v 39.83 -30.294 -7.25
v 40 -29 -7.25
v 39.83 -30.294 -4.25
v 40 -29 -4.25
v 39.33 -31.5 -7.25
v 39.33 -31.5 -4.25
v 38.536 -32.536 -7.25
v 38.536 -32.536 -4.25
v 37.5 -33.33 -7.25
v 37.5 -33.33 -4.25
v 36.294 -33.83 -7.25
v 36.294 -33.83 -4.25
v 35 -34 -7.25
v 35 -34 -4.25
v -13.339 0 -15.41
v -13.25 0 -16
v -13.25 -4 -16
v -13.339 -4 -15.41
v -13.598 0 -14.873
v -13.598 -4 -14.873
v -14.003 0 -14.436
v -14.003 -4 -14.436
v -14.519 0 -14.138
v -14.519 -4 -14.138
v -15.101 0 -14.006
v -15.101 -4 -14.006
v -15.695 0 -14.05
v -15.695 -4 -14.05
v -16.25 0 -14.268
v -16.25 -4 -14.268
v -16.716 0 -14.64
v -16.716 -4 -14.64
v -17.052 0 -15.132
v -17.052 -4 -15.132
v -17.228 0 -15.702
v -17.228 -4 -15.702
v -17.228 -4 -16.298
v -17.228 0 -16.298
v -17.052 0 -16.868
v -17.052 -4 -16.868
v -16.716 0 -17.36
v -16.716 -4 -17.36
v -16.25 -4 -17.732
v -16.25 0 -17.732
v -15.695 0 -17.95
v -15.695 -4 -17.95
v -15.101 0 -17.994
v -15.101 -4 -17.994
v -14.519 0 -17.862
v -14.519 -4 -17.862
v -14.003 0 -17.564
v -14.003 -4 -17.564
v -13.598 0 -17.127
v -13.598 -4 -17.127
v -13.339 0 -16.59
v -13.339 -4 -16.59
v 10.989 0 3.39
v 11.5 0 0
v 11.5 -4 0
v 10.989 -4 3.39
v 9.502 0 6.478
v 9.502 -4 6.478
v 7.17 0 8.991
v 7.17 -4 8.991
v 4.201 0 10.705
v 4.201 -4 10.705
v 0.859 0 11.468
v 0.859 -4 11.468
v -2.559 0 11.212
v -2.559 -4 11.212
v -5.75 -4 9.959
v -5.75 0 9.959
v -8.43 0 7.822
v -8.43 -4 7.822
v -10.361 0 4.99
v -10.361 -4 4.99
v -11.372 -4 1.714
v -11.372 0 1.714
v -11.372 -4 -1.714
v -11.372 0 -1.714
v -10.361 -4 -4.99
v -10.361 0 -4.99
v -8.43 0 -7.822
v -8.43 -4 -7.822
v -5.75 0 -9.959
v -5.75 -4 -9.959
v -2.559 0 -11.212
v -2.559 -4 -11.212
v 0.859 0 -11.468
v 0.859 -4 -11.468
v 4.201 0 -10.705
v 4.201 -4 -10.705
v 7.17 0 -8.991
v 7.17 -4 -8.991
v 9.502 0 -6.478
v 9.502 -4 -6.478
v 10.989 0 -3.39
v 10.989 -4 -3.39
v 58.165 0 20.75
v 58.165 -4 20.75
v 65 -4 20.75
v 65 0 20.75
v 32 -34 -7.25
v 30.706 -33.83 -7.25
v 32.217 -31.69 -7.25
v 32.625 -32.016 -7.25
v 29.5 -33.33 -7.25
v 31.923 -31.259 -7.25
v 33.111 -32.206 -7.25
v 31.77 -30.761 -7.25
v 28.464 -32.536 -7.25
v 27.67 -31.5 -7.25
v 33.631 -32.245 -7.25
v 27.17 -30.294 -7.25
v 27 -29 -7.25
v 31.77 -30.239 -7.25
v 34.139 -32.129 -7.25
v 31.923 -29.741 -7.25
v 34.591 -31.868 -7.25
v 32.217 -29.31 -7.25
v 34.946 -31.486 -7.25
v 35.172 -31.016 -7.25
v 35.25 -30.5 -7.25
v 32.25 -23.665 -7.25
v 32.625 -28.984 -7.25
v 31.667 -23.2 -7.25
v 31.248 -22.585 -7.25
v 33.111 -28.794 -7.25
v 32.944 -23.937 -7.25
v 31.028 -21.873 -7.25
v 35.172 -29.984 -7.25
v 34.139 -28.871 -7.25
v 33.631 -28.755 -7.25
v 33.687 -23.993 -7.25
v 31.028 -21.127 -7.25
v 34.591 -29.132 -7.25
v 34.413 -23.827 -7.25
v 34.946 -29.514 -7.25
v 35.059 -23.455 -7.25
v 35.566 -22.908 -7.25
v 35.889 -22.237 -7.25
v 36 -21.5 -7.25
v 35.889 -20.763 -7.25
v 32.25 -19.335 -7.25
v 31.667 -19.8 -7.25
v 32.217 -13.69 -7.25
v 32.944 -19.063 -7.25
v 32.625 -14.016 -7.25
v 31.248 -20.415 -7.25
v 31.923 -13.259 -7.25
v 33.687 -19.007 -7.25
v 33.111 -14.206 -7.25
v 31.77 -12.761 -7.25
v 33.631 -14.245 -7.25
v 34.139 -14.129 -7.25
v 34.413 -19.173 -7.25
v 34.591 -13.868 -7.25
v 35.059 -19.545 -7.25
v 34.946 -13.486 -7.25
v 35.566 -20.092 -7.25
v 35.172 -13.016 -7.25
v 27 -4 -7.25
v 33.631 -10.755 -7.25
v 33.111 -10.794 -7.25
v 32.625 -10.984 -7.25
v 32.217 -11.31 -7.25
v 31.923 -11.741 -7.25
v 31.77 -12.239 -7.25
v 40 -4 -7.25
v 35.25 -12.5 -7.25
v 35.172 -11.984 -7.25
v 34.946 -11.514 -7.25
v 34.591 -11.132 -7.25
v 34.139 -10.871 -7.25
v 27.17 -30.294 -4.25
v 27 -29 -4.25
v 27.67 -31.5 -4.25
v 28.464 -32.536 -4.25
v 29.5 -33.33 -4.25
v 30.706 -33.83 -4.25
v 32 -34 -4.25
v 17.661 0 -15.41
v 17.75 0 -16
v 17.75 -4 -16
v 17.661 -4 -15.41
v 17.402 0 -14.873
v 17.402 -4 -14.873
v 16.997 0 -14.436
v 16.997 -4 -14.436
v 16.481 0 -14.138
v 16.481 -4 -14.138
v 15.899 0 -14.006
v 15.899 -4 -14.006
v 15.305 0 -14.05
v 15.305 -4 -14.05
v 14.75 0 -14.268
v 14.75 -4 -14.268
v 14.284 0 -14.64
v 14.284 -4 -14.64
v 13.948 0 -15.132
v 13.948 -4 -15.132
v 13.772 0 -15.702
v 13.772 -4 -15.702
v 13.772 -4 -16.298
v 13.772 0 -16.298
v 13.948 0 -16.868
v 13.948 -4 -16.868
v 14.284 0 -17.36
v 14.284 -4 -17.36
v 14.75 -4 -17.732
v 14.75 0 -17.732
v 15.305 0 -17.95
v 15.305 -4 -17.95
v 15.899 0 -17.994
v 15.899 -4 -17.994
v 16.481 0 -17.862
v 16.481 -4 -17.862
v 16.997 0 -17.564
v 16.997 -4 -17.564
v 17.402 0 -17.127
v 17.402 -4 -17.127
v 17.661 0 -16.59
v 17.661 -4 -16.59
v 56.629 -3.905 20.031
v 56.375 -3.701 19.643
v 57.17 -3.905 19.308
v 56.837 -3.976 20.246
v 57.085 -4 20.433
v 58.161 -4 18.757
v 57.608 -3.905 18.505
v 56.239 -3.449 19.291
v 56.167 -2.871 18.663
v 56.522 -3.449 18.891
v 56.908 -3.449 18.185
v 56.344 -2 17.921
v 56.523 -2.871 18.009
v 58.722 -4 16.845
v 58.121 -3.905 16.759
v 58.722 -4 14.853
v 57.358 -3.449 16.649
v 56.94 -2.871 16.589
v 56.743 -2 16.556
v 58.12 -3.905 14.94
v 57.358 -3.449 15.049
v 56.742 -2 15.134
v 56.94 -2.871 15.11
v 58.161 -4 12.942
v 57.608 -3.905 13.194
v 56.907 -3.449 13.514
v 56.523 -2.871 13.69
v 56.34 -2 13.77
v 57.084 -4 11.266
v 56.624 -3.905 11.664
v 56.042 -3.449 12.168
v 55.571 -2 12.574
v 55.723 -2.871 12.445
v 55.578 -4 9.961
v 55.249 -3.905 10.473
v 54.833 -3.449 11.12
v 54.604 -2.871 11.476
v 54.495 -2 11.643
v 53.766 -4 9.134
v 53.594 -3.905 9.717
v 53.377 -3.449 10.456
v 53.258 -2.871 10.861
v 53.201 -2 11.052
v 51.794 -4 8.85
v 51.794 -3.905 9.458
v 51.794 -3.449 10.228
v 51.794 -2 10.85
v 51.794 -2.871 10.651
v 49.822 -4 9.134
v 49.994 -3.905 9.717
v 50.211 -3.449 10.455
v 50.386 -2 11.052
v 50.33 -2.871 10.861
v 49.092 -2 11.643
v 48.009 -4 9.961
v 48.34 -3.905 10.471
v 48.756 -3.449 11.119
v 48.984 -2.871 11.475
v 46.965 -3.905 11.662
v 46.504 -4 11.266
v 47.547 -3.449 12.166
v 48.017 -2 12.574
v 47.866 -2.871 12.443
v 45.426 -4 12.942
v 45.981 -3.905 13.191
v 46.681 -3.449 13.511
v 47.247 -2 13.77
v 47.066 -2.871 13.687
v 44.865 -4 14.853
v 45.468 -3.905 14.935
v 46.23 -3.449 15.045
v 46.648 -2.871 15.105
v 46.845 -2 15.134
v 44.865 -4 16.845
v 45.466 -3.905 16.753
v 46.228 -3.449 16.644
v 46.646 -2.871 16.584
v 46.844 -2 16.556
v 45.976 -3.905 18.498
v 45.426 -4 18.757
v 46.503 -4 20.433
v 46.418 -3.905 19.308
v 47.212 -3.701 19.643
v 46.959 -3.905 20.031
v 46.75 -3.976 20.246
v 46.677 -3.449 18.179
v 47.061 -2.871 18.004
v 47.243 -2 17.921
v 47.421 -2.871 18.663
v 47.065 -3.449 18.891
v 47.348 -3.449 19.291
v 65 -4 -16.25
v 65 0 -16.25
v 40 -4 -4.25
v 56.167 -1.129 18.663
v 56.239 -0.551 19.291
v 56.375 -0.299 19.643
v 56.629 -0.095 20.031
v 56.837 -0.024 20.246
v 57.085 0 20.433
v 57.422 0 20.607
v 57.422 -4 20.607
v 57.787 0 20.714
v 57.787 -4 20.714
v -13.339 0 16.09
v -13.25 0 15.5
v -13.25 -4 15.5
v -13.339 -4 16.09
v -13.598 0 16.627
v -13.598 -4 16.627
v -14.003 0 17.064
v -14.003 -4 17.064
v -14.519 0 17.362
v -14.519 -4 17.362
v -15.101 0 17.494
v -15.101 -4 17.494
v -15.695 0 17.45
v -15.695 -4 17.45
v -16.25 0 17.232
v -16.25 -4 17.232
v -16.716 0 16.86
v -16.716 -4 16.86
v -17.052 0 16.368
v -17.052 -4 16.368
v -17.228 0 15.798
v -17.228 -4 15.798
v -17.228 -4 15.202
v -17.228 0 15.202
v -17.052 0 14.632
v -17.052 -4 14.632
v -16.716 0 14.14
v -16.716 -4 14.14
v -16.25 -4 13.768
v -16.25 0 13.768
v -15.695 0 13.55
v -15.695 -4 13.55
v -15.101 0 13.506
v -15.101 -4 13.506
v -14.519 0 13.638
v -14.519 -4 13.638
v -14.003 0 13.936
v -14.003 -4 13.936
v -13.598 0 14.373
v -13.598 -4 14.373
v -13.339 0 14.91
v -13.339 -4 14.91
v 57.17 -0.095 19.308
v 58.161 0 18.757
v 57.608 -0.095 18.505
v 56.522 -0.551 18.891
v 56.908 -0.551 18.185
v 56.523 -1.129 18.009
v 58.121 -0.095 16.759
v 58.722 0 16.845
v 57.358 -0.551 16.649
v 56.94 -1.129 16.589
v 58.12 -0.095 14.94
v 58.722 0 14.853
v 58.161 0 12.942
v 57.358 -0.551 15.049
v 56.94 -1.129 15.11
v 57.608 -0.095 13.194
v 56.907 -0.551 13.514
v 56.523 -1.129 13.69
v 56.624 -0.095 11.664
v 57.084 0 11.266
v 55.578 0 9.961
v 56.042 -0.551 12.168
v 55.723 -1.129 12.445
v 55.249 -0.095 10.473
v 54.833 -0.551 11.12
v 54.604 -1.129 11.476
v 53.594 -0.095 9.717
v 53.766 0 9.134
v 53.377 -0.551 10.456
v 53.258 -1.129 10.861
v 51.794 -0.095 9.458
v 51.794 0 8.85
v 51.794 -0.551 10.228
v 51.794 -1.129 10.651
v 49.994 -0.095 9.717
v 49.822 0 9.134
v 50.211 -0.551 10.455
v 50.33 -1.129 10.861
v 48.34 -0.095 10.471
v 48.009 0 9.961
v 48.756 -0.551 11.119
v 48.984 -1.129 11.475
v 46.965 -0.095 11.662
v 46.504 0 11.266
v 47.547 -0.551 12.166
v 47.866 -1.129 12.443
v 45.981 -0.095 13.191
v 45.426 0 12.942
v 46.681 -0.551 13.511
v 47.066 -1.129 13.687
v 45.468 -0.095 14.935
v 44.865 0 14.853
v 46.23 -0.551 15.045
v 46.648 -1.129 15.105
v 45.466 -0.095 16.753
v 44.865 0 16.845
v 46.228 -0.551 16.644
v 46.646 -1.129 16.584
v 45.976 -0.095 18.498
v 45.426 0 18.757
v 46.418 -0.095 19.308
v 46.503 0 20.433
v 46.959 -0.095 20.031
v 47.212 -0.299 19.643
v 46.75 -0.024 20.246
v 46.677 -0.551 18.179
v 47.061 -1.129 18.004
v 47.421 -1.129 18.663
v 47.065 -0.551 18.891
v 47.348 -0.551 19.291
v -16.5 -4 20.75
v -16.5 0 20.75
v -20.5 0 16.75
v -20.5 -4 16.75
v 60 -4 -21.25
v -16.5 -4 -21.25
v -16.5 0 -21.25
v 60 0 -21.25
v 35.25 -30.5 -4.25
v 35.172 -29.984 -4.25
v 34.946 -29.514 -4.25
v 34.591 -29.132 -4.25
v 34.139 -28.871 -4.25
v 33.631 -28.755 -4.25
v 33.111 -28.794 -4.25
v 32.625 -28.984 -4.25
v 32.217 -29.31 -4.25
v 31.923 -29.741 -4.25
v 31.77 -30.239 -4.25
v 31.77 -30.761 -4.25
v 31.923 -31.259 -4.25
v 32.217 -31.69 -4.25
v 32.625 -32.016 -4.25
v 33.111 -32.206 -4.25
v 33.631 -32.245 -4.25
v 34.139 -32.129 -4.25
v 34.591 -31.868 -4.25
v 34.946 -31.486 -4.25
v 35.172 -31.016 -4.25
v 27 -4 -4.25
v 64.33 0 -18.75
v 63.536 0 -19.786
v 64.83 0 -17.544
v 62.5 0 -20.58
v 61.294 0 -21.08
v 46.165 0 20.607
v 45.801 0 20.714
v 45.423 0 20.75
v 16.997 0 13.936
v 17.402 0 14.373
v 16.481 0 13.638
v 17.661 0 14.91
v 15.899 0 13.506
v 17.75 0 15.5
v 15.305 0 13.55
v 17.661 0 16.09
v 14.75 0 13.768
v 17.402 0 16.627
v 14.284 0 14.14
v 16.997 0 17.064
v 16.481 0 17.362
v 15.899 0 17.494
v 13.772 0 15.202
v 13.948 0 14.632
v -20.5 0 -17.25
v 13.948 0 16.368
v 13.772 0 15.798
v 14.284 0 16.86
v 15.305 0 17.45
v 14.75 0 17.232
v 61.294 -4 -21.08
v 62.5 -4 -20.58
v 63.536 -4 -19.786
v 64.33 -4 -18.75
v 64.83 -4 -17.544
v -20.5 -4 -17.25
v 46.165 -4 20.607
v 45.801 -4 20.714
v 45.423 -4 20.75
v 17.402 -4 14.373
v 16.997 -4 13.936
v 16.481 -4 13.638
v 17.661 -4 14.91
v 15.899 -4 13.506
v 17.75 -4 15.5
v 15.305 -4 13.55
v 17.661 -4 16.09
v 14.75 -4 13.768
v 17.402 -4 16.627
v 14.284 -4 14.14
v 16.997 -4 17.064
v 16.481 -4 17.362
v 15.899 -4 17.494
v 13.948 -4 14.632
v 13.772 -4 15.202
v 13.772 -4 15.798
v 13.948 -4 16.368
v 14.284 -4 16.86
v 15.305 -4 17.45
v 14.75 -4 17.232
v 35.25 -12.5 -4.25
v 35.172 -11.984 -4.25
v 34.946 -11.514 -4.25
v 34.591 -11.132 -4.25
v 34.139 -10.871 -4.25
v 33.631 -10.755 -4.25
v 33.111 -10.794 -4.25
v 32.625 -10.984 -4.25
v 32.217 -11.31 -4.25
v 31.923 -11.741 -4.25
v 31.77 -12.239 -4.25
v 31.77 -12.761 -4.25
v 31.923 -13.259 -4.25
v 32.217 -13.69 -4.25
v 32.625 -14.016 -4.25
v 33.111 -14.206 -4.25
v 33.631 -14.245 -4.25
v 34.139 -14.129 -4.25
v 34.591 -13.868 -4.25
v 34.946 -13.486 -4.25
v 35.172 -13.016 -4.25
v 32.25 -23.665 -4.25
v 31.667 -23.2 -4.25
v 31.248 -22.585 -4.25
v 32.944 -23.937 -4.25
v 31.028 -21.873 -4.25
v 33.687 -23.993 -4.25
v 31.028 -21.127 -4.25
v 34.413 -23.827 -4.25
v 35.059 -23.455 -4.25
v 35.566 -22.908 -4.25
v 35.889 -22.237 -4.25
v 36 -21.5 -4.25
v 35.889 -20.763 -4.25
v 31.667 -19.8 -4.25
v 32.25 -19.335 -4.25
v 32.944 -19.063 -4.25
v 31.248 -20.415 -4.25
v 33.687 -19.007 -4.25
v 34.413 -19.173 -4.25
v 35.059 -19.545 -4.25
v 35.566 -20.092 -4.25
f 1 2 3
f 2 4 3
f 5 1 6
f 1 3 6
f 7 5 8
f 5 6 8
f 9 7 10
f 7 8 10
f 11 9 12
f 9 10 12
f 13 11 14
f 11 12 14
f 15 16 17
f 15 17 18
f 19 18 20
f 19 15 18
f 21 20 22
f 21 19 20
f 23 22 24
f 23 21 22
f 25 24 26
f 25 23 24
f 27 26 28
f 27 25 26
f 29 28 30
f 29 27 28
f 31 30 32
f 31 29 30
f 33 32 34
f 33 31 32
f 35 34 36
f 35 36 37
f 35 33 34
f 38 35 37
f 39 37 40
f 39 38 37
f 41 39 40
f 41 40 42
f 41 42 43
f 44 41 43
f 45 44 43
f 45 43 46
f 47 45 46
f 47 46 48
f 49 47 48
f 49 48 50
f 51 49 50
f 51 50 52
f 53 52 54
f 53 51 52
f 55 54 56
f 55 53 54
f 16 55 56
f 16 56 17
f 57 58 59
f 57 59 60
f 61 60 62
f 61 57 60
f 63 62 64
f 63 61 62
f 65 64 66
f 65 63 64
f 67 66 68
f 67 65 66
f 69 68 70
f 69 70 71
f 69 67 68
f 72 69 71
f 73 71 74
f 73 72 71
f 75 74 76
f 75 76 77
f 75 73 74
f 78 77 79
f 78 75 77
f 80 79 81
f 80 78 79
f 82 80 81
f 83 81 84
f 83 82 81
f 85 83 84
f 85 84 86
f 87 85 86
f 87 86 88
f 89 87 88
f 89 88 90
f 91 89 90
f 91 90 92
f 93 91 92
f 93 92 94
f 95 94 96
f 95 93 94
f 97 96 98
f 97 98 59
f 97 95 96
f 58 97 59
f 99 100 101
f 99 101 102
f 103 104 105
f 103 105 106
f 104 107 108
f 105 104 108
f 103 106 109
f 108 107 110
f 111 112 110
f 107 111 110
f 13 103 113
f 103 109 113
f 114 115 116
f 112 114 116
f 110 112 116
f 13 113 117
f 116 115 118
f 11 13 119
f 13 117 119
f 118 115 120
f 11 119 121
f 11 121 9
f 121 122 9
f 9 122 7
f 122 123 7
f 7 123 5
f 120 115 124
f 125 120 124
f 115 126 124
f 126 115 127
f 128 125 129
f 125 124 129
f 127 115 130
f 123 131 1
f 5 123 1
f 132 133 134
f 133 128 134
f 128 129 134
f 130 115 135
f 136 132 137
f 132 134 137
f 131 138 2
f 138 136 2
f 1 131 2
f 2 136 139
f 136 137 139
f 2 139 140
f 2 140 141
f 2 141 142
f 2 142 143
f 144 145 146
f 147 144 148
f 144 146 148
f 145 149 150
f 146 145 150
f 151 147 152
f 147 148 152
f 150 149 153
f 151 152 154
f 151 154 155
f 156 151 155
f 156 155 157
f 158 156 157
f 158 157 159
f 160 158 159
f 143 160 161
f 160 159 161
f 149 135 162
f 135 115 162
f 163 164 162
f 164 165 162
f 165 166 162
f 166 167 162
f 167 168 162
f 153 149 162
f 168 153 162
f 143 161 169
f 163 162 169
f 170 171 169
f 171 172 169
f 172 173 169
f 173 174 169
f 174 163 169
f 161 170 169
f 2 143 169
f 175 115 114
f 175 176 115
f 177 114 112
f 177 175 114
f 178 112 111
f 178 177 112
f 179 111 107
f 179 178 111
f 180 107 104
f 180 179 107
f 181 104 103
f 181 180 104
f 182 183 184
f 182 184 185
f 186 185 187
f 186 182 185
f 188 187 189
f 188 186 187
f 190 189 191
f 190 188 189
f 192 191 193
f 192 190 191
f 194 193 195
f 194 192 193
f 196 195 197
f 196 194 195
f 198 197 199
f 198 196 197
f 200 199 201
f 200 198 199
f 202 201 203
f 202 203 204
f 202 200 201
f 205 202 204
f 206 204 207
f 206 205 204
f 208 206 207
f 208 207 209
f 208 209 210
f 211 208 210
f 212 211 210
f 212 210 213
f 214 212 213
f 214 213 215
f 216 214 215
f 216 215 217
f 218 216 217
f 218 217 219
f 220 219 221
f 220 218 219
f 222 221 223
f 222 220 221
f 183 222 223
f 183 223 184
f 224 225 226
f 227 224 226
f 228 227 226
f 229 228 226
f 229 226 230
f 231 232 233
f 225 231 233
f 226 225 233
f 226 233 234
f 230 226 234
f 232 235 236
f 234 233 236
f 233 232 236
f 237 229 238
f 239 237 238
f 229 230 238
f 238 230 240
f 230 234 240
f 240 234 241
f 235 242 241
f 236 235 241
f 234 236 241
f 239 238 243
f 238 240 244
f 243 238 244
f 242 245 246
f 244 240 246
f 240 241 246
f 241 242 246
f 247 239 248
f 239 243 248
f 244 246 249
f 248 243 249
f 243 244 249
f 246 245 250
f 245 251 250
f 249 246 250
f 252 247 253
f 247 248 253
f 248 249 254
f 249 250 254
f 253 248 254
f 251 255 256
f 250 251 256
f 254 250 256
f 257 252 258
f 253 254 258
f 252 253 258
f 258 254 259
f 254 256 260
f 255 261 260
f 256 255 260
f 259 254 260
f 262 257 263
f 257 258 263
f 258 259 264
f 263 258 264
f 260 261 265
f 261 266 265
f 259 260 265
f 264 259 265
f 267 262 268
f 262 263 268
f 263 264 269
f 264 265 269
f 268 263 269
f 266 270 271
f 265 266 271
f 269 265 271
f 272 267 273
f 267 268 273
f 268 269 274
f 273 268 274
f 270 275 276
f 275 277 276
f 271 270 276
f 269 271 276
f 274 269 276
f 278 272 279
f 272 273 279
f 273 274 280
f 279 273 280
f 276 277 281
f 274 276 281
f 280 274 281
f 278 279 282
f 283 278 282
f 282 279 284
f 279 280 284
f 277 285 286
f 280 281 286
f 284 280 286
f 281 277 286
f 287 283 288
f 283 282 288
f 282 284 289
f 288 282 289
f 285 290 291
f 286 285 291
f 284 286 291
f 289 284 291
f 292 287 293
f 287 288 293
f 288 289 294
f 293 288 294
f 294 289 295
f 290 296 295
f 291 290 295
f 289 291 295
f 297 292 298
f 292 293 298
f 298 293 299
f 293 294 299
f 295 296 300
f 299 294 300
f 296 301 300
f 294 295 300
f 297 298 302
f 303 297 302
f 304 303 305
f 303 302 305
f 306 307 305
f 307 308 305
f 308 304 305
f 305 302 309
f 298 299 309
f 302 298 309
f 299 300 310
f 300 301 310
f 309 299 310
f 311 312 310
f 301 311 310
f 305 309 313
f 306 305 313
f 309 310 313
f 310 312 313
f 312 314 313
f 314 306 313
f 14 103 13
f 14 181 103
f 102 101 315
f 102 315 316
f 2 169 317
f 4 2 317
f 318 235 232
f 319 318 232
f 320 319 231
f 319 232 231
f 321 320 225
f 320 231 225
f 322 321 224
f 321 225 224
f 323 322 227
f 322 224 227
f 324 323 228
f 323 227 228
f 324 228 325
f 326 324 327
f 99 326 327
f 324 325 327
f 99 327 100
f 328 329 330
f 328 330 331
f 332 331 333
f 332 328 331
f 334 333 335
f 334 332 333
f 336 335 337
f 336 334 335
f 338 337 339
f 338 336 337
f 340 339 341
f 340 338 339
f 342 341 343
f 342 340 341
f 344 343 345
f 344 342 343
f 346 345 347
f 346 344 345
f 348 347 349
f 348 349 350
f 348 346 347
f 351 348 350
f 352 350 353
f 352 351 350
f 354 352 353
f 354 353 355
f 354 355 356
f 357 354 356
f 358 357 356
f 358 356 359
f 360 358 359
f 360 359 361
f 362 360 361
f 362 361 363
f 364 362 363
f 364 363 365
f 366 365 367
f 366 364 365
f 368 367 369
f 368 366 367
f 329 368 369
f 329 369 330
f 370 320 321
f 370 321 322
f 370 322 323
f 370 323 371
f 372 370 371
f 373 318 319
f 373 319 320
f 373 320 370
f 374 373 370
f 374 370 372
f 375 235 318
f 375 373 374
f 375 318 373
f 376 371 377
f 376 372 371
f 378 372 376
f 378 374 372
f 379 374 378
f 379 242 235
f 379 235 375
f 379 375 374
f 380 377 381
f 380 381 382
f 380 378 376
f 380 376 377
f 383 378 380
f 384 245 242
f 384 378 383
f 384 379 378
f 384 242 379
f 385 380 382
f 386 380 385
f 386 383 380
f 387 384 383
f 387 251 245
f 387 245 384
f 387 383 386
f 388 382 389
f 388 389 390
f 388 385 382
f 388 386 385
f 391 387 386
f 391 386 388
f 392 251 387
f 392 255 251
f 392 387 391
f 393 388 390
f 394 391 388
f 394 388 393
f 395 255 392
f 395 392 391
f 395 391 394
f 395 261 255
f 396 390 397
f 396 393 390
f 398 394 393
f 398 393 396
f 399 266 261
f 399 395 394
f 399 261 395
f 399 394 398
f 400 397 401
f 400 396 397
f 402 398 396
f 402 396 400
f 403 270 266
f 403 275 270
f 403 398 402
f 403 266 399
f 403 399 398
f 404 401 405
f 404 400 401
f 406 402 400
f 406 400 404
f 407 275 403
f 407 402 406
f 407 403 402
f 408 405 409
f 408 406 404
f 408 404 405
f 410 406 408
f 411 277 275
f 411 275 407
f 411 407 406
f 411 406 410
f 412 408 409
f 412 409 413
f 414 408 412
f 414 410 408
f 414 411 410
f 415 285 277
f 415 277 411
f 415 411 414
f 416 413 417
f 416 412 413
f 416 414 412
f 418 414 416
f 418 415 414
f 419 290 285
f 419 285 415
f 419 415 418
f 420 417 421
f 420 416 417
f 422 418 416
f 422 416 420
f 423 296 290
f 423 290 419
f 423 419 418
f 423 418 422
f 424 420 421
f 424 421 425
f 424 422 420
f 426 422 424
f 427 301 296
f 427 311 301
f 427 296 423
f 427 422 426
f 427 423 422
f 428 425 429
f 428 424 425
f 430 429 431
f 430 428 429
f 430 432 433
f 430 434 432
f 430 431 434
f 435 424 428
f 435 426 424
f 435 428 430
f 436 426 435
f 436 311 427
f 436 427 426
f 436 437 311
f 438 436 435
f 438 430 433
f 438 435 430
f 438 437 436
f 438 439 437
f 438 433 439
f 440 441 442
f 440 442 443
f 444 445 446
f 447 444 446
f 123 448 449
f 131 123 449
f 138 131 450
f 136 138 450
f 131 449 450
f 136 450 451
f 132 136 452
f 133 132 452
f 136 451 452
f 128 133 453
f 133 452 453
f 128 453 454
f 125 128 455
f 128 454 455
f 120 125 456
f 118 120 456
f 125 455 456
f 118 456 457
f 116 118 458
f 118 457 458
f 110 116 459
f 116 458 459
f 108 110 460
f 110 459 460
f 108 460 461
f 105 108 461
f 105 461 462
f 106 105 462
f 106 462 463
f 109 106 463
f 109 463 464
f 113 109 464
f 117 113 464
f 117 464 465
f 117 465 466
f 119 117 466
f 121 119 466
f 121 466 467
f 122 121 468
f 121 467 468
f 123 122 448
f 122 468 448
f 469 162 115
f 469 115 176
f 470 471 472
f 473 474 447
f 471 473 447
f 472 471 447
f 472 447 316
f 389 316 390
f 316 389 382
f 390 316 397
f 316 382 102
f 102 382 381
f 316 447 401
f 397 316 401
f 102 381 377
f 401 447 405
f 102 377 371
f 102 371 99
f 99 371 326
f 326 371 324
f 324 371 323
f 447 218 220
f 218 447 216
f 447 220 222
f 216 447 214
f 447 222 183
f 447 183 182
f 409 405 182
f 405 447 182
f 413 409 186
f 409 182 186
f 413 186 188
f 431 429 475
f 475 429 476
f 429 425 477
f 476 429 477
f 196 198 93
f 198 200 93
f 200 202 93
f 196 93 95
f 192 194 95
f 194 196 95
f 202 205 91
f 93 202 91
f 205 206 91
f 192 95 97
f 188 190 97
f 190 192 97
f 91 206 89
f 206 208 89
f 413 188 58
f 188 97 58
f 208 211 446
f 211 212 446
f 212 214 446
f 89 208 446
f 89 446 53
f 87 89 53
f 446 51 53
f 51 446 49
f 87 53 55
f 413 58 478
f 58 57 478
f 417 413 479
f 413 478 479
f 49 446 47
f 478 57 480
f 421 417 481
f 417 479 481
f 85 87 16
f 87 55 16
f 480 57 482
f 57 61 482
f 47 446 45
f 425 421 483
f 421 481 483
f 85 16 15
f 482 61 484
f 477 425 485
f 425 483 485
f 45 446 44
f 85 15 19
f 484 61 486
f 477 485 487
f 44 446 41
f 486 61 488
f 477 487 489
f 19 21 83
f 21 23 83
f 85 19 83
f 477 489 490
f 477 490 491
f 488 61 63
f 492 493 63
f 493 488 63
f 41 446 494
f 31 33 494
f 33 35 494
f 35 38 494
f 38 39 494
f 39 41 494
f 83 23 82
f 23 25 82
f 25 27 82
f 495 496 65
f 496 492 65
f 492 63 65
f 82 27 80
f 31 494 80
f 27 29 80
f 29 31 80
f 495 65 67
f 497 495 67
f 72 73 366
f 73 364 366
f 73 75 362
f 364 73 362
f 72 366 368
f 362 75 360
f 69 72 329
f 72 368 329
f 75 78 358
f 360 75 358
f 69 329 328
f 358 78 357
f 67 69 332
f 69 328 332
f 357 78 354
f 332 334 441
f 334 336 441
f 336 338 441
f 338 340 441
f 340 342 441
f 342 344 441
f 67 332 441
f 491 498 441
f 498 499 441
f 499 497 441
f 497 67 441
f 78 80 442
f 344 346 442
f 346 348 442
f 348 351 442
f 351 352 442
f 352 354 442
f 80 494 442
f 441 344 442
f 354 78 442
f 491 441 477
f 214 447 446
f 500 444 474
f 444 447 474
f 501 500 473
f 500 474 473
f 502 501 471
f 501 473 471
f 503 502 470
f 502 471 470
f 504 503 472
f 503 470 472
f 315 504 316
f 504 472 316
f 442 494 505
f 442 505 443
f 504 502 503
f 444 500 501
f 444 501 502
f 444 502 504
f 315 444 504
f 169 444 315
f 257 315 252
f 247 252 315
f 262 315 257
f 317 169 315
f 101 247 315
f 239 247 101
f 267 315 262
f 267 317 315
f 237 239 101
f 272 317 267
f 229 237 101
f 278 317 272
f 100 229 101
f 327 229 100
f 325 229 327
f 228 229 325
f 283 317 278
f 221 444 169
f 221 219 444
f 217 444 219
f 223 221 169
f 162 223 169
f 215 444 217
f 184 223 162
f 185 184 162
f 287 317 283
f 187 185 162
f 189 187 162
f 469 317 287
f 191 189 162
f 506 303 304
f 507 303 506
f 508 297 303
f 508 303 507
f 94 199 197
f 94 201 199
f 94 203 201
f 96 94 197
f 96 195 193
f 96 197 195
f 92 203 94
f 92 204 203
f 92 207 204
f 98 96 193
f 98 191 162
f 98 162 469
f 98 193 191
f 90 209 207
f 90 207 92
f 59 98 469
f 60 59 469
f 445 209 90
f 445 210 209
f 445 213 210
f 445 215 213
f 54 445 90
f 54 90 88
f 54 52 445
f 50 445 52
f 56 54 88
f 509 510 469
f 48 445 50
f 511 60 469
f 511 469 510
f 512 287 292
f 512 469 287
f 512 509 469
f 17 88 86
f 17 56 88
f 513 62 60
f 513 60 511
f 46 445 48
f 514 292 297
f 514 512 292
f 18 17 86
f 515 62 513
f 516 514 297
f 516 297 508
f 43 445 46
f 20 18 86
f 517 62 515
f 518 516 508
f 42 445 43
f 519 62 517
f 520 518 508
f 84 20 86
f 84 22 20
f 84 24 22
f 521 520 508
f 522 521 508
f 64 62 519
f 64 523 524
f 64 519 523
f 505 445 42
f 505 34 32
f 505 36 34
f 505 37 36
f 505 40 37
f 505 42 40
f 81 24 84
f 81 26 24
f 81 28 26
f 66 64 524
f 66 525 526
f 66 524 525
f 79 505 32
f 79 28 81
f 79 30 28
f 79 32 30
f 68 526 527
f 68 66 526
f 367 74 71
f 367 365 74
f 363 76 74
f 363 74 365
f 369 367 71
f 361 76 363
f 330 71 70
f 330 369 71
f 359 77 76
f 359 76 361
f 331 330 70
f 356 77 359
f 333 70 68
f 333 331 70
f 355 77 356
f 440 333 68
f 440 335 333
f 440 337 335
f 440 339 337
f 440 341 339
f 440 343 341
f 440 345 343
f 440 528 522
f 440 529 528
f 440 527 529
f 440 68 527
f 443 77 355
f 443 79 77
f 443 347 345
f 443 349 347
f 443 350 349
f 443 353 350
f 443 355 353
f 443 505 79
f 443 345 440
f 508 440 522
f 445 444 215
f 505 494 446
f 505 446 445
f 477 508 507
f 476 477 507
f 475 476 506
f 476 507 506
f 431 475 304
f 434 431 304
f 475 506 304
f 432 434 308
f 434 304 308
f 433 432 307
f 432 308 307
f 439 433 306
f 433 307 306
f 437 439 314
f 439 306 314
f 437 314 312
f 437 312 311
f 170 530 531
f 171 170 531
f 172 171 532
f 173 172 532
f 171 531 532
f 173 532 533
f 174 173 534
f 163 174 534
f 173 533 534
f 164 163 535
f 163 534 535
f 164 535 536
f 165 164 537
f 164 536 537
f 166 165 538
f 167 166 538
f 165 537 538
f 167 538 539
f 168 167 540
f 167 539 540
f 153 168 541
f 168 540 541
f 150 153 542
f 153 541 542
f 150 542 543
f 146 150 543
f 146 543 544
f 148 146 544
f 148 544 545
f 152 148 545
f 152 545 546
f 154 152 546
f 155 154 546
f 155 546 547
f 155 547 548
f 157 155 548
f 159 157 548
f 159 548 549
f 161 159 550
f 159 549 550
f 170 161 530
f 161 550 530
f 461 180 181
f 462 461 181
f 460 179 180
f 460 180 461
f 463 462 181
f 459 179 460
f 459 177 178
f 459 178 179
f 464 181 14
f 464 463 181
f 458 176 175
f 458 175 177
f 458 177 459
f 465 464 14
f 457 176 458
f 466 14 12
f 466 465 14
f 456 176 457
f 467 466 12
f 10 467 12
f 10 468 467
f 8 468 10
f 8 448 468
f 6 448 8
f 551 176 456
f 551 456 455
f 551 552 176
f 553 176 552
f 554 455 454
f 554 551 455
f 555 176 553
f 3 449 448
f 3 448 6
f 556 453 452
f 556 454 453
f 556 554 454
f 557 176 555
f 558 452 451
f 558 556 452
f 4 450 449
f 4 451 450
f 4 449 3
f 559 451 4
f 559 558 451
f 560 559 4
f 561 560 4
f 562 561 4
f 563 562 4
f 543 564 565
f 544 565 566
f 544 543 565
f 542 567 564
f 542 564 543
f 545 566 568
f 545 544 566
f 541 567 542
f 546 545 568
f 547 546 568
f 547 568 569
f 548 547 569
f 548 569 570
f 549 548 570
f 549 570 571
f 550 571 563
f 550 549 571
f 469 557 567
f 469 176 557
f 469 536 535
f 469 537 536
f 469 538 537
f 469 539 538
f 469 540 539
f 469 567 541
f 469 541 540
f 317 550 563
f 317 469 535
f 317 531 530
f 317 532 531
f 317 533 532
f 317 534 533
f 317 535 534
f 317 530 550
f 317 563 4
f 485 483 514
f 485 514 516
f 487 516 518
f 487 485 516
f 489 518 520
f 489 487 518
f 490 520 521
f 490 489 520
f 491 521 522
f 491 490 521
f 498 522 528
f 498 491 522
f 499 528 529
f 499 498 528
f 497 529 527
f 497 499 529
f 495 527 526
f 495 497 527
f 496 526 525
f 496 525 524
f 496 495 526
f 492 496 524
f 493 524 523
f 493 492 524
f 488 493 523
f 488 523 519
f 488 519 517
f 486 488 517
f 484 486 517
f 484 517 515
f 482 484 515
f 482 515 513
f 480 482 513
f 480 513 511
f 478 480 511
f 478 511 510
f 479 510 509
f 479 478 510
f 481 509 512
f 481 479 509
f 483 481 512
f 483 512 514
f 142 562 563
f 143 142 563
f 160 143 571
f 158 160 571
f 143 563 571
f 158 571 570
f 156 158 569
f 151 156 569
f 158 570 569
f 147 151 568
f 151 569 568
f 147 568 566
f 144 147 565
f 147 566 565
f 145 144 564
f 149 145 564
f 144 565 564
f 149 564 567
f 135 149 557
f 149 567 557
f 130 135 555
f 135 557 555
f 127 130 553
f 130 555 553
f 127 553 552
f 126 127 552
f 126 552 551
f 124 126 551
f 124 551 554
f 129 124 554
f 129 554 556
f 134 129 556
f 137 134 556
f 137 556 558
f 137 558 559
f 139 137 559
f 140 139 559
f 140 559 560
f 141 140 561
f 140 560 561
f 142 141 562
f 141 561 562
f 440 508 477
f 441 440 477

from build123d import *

# Parameters (mm, degrees)
F0_W      = 63.5
F0_H      = 42
F0_R      = 2
F0_R_2    = 11.5
F1_DEPTH  = 4
F2_SIZE   = 4
F3_W      = 13
F3_H      = 3
F4_DEPTH  = 30
F5_R      = 5
F6_R      = 2.5
F6_R_2    = 1.75
F7_DEPTH  = 3
F8_W      = 4
F8_H      = 42
F9_DEPTH  = 22
F10_R     = 5
F11_R     = 5
F12_DEPTH = 4
F13_R     = 1.99999


# Not quite as in the source:
# - a fillet or chamfer is up to 0.001 mm smaller than in the source, because OpenCascade refuses the exact size


with BuildPart() as f1:
    # F0 (on Front) → F1 (new body)
    with BuildSketch(Plane.XZ):
        with Locations((11.25, -0.25)):
            Rectangle(F0_W, F0_H)
        with Locations((-15.25, -16)):
            Circle(F0_R, mode=Mode.SUBTRACT)
        with Locations((15.75, -16)):
            Circle(F0_R, mode=Mode.SUBTRACT)
        Circle(F0_R_2, mode=Mode.SUBTRACT)
        with Locations((-15.25, 15.5)):
            Circle(F0_R, mode=Mode.SUBTRACT)
        with Locations((15.75, 15.5)):
            Circle(F0_R, mode=Mode.SUBTRACT)
    extrude(amount=F1_DEPTH)

    # F2
    f2_edges = [f1.edges().sort_by_distance(p)[0] for p in [
        (-20.5, -2, -21.25),
        (-20.5, -2, 20.75),
    ]]
    chamfer(f2_edges, length=F2_SIZE)

    # F3 (on face) → F4 (join)
    with BuildSketch(Plane.XZ.offset(4)):
        with Locations((33.5, -5.75)):
            Rectangle(F3_W, F3_H)
    extrude(amount=F4_DEPTH)

    # F5
    f5_edges = [f1.edges().sort_by_distance(p)[0] for p in [
        (40, -34, -5.75),
        (27, -34, -5.75),
    ]]
    fillet(f5_edges, radius=F5_R)

    # F6 (on face) → F7 (cut, through all)
    with BuildSketch(Plane.XY.offset(-4.25)):
        with Locations((33.5, -21.5)):
            Circle(F6_R)
        with Locations((33.5, -30.5)):
            Circle(F6_R_2)
        with Locations((33.5, -12.5)):
            Circle(F6_R_2)
    extrude(amount=-F7_DEPTH, mode=Mode.SUBTRACT)

    # F8 (on face) → F9 (join)
    with BuildSketch(Plane.YZ.offset(43)):
        with Locations((-2, -0.25)):
            Rectangle(F8_W, F8_H)
    extrude(amount=F9_DEPTH)

    # F10
    f10_edges = [f1.edges().sort_by_distance(p)[0] for p in [
        (65, -2, -21.25),
    ]]
    fillet(f10_edges, radius=F10_R)

    # F11 (on face) → F12 (cut, through all)
    with BuildSketch(Plane.XZ.offset(4)):
        with Locations((51.7936311662, 15.85)):
            Circle(F11_R)
    extrude(amount=-F12_DEPTH, mode=Mode.SUBTRACT)

    # F13 (radius 2 in the source; OpenCascade refuses exactly that, so slightly less here)
    f13_edges = [f1.edges().sort_by_distance(p)[0] for p in [
        (51.793631, -4, 10.85),
        (51.793631, 0, 10.85),
        (50.798644, -2, 20.75),
        (52.788619, -2, 20.75),
    ]]
    fillet(f13_edges, radius=F13_R)


solid = f1.part
